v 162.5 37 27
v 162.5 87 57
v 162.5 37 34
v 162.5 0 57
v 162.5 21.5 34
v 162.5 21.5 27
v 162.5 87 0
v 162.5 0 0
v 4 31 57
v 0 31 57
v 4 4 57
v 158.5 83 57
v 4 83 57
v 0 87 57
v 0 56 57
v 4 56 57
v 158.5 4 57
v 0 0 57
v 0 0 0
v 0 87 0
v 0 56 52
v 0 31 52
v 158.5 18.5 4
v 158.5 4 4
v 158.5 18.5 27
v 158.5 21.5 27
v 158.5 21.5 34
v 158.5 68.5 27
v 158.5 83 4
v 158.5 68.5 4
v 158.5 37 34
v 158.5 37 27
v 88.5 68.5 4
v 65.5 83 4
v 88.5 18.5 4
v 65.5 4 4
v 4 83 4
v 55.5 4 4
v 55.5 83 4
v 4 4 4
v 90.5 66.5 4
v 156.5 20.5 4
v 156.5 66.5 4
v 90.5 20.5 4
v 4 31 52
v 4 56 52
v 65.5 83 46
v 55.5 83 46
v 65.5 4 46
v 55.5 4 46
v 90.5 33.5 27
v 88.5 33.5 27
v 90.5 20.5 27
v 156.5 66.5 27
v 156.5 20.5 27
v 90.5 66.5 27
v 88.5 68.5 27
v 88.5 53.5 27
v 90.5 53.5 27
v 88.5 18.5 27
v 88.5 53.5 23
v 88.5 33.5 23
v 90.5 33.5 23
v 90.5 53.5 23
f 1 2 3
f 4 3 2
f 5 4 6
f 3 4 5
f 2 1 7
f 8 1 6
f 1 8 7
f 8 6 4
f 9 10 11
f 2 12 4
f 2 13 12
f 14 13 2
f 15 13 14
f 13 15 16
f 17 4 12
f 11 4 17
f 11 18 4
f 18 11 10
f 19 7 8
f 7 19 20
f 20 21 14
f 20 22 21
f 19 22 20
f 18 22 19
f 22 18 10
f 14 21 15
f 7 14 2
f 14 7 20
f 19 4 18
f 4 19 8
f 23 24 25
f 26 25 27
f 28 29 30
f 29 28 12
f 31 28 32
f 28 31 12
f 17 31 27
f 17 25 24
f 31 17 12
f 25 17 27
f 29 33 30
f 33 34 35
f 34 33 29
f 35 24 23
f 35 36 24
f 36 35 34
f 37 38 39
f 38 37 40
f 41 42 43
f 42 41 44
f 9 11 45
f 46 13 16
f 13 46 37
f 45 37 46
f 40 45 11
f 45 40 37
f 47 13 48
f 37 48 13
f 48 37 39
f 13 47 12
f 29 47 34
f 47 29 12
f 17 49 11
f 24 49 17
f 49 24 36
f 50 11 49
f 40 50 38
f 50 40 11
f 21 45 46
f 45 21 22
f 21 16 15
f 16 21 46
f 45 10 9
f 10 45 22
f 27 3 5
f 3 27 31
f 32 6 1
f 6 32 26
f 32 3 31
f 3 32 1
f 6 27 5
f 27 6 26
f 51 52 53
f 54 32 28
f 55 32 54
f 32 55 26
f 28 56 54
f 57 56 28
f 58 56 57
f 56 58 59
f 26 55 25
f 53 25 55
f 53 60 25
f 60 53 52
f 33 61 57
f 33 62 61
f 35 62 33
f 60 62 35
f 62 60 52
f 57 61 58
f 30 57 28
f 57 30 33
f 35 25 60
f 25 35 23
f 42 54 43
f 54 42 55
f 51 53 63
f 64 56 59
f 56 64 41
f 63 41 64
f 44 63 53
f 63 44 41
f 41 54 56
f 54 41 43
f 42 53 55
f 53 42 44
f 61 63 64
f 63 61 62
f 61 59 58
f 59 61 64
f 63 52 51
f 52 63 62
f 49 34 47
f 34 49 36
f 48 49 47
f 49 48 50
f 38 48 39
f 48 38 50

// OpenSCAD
//below dimensions are in units of millimeter(mm)


union(){
    difference(){
       cube([162.5,87,57]);/*outer cuboid*/
       translate([4,4,4]){cube([154.5,79,53]);}/*cavity inside outer cuboid*/
       translate([0,31,52]){cube([4,25,5]);}/*hole for transformer input*/
       translate([158.5,21.5,27]){cube([4,15.5,7]);}/*hole for USB-A*/}
    translate([55.5,4,4]){cube([10,79,42]);} /*middle partetion*/  
    
    /*platform for PCB*/
    
    translate([88.5,18.5,4]){      
           difference(){
                 cube([70,50,23]);
               translate([2,2,0]){cube([66,46,23]);}
               translate([0,15,19]){cube([2,20,4]);}}
           }
       }           
